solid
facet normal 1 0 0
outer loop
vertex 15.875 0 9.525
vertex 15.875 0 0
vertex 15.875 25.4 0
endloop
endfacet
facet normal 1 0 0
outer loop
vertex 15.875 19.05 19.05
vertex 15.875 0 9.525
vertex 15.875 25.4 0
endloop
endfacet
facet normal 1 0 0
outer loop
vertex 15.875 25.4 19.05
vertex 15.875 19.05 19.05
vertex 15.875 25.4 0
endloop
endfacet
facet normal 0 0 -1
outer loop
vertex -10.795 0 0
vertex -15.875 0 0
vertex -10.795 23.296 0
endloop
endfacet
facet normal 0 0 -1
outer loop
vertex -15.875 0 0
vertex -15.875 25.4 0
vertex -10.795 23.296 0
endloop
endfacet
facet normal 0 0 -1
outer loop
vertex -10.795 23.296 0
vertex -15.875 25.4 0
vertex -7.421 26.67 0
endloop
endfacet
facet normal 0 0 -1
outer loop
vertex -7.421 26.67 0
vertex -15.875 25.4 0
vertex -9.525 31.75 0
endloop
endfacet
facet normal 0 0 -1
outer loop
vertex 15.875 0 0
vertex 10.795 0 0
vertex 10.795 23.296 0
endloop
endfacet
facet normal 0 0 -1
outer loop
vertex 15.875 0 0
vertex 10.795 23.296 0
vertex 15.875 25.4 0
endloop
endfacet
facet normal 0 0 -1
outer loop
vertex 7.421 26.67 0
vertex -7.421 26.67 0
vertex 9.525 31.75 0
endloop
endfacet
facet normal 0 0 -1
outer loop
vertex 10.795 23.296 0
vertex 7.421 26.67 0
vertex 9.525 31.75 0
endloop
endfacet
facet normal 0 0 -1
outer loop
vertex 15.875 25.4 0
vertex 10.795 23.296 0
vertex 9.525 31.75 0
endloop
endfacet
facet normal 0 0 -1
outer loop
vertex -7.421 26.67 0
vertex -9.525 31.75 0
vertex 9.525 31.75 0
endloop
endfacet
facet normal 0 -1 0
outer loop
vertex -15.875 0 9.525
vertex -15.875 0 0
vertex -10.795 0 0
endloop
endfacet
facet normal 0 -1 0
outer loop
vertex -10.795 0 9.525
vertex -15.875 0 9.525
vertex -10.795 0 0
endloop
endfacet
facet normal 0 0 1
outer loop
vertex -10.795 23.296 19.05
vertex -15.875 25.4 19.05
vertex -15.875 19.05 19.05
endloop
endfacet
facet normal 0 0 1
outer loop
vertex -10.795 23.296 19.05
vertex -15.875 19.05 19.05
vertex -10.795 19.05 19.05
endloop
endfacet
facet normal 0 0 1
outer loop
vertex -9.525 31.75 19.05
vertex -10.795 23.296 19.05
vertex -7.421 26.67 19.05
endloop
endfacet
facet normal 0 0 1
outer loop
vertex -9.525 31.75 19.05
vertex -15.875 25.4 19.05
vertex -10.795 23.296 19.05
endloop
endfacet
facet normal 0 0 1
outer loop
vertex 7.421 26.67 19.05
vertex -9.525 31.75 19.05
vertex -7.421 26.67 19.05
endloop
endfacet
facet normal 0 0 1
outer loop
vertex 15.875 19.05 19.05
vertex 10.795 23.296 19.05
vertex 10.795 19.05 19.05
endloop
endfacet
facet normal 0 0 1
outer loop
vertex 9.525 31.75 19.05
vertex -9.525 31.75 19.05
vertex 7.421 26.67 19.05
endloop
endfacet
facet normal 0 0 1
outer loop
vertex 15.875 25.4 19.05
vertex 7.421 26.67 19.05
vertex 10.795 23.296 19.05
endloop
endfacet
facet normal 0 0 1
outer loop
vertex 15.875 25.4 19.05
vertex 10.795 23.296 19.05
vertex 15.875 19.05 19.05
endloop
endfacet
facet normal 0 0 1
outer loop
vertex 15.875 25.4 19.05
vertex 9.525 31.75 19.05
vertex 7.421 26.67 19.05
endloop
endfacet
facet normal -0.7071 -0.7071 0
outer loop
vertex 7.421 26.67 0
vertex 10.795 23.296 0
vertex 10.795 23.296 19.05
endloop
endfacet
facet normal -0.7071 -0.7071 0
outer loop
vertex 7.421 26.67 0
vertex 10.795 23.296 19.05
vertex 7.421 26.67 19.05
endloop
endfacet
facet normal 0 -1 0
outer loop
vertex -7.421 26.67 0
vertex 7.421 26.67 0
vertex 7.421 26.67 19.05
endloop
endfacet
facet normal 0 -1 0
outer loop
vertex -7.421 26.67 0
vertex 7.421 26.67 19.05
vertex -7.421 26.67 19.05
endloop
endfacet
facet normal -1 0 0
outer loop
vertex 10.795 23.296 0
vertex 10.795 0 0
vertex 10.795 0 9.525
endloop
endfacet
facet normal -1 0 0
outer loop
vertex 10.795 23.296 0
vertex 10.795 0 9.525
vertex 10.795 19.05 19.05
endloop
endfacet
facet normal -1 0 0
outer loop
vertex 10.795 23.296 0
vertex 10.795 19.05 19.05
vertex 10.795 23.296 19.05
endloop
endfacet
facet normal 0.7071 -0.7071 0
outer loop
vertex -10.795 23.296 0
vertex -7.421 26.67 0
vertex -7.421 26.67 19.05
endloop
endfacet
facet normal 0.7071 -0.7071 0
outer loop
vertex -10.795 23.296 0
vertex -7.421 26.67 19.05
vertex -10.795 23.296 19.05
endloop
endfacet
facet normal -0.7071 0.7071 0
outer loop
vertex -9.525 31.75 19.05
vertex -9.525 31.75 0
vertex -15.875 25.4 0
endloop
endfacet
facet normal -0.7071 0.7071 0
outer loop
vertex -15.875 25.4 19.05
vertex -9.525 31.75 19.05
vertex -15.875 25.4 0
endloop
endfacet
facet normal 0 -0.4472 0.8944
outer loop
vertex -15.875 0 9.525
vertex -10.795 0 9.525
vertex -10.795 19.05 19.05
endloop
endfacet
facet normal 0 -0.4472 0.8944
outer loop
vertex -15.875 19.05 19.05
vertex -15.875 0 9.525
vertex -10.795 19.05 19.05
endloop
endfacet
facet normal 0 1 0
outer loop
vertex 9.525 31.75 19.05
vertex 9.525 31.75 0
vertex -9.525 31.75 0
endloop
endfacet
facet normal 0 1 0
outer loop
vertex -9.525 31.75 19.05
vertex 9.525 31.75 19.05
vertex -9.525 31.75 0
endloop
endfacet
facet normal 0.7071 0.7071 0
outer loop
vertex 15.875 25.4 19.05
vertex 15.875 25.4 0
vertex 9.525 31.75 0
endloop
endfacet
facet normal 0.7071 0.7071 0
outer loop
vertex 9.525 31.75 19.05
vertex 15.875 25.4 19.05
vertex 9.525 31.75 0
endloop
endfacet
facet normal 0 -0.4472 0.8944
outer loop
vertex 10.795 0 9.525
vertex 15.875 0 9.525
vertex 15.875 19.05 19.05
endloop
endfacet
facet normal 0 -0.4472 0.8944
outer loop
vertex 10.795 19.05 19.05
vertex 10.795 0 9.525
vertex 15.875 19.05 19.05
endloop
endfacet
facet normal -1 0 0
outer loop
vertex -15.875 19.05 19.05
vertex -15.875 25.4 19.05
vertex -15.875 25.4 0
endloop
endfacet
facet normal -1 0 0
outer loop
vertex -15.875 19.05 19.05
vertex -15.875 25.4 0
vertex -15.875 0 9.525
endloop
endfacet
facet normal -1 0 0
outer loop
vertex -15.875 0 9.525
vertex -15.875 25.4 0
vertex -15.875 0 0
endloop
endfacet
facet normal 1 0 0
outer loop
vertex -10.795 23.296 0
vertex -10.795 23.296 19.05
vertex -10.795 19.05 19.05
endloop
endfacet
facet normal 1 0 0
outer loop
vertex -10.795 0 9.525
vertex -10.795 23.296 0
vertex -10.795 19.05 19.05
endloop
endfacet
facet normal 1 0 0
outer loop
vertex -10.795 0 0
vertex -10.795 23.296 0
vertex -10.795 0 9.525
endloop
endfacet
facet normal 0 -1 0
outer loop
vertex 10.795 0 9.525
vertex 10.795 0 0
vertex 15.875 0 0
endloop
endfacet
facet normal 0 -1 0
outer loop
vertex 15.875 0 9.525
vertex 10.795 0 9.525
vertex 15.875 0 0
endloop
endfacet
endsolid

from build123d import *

# Parameters (mm, degrees)
F1_DEPTH = 19.05
F2_T     = -5.08
F4_DEPTH = 31.751


with BuildPart() as f1:
    # F0 (on Top) → F1 (new body)
    with BuildSketch(Plane.XY):
        Polygon((-15.875, 25.4), (-15.875, 0), (15.875, 0), (15.875, 25.4), (9.525, 31.75), (-9.525, 31.75), align=None)
    extrude(amount=F1_DEPTH)

    # F2
    f2_openings = [f1.faces().sort_by_distance(p)[0] for p in [
        (0, 15.301736, 19.05),
        (0, 0, 9.525),
        (0, 15.301736, 0),
    ]]
    offset(amount=F2_T, openings=f2_openings)

    # F3 (on face) → F4 (cut, through all)
    with BuildSketch(Plane.YZ.offset(15.875)):
        Polygon((0, 19.05), (0, 9.525), (19.05, 19.05), align=None)
    extrude(amount=-F4_DEPTH, mode=Mode.SUBTRACT)


solid = f1.part
